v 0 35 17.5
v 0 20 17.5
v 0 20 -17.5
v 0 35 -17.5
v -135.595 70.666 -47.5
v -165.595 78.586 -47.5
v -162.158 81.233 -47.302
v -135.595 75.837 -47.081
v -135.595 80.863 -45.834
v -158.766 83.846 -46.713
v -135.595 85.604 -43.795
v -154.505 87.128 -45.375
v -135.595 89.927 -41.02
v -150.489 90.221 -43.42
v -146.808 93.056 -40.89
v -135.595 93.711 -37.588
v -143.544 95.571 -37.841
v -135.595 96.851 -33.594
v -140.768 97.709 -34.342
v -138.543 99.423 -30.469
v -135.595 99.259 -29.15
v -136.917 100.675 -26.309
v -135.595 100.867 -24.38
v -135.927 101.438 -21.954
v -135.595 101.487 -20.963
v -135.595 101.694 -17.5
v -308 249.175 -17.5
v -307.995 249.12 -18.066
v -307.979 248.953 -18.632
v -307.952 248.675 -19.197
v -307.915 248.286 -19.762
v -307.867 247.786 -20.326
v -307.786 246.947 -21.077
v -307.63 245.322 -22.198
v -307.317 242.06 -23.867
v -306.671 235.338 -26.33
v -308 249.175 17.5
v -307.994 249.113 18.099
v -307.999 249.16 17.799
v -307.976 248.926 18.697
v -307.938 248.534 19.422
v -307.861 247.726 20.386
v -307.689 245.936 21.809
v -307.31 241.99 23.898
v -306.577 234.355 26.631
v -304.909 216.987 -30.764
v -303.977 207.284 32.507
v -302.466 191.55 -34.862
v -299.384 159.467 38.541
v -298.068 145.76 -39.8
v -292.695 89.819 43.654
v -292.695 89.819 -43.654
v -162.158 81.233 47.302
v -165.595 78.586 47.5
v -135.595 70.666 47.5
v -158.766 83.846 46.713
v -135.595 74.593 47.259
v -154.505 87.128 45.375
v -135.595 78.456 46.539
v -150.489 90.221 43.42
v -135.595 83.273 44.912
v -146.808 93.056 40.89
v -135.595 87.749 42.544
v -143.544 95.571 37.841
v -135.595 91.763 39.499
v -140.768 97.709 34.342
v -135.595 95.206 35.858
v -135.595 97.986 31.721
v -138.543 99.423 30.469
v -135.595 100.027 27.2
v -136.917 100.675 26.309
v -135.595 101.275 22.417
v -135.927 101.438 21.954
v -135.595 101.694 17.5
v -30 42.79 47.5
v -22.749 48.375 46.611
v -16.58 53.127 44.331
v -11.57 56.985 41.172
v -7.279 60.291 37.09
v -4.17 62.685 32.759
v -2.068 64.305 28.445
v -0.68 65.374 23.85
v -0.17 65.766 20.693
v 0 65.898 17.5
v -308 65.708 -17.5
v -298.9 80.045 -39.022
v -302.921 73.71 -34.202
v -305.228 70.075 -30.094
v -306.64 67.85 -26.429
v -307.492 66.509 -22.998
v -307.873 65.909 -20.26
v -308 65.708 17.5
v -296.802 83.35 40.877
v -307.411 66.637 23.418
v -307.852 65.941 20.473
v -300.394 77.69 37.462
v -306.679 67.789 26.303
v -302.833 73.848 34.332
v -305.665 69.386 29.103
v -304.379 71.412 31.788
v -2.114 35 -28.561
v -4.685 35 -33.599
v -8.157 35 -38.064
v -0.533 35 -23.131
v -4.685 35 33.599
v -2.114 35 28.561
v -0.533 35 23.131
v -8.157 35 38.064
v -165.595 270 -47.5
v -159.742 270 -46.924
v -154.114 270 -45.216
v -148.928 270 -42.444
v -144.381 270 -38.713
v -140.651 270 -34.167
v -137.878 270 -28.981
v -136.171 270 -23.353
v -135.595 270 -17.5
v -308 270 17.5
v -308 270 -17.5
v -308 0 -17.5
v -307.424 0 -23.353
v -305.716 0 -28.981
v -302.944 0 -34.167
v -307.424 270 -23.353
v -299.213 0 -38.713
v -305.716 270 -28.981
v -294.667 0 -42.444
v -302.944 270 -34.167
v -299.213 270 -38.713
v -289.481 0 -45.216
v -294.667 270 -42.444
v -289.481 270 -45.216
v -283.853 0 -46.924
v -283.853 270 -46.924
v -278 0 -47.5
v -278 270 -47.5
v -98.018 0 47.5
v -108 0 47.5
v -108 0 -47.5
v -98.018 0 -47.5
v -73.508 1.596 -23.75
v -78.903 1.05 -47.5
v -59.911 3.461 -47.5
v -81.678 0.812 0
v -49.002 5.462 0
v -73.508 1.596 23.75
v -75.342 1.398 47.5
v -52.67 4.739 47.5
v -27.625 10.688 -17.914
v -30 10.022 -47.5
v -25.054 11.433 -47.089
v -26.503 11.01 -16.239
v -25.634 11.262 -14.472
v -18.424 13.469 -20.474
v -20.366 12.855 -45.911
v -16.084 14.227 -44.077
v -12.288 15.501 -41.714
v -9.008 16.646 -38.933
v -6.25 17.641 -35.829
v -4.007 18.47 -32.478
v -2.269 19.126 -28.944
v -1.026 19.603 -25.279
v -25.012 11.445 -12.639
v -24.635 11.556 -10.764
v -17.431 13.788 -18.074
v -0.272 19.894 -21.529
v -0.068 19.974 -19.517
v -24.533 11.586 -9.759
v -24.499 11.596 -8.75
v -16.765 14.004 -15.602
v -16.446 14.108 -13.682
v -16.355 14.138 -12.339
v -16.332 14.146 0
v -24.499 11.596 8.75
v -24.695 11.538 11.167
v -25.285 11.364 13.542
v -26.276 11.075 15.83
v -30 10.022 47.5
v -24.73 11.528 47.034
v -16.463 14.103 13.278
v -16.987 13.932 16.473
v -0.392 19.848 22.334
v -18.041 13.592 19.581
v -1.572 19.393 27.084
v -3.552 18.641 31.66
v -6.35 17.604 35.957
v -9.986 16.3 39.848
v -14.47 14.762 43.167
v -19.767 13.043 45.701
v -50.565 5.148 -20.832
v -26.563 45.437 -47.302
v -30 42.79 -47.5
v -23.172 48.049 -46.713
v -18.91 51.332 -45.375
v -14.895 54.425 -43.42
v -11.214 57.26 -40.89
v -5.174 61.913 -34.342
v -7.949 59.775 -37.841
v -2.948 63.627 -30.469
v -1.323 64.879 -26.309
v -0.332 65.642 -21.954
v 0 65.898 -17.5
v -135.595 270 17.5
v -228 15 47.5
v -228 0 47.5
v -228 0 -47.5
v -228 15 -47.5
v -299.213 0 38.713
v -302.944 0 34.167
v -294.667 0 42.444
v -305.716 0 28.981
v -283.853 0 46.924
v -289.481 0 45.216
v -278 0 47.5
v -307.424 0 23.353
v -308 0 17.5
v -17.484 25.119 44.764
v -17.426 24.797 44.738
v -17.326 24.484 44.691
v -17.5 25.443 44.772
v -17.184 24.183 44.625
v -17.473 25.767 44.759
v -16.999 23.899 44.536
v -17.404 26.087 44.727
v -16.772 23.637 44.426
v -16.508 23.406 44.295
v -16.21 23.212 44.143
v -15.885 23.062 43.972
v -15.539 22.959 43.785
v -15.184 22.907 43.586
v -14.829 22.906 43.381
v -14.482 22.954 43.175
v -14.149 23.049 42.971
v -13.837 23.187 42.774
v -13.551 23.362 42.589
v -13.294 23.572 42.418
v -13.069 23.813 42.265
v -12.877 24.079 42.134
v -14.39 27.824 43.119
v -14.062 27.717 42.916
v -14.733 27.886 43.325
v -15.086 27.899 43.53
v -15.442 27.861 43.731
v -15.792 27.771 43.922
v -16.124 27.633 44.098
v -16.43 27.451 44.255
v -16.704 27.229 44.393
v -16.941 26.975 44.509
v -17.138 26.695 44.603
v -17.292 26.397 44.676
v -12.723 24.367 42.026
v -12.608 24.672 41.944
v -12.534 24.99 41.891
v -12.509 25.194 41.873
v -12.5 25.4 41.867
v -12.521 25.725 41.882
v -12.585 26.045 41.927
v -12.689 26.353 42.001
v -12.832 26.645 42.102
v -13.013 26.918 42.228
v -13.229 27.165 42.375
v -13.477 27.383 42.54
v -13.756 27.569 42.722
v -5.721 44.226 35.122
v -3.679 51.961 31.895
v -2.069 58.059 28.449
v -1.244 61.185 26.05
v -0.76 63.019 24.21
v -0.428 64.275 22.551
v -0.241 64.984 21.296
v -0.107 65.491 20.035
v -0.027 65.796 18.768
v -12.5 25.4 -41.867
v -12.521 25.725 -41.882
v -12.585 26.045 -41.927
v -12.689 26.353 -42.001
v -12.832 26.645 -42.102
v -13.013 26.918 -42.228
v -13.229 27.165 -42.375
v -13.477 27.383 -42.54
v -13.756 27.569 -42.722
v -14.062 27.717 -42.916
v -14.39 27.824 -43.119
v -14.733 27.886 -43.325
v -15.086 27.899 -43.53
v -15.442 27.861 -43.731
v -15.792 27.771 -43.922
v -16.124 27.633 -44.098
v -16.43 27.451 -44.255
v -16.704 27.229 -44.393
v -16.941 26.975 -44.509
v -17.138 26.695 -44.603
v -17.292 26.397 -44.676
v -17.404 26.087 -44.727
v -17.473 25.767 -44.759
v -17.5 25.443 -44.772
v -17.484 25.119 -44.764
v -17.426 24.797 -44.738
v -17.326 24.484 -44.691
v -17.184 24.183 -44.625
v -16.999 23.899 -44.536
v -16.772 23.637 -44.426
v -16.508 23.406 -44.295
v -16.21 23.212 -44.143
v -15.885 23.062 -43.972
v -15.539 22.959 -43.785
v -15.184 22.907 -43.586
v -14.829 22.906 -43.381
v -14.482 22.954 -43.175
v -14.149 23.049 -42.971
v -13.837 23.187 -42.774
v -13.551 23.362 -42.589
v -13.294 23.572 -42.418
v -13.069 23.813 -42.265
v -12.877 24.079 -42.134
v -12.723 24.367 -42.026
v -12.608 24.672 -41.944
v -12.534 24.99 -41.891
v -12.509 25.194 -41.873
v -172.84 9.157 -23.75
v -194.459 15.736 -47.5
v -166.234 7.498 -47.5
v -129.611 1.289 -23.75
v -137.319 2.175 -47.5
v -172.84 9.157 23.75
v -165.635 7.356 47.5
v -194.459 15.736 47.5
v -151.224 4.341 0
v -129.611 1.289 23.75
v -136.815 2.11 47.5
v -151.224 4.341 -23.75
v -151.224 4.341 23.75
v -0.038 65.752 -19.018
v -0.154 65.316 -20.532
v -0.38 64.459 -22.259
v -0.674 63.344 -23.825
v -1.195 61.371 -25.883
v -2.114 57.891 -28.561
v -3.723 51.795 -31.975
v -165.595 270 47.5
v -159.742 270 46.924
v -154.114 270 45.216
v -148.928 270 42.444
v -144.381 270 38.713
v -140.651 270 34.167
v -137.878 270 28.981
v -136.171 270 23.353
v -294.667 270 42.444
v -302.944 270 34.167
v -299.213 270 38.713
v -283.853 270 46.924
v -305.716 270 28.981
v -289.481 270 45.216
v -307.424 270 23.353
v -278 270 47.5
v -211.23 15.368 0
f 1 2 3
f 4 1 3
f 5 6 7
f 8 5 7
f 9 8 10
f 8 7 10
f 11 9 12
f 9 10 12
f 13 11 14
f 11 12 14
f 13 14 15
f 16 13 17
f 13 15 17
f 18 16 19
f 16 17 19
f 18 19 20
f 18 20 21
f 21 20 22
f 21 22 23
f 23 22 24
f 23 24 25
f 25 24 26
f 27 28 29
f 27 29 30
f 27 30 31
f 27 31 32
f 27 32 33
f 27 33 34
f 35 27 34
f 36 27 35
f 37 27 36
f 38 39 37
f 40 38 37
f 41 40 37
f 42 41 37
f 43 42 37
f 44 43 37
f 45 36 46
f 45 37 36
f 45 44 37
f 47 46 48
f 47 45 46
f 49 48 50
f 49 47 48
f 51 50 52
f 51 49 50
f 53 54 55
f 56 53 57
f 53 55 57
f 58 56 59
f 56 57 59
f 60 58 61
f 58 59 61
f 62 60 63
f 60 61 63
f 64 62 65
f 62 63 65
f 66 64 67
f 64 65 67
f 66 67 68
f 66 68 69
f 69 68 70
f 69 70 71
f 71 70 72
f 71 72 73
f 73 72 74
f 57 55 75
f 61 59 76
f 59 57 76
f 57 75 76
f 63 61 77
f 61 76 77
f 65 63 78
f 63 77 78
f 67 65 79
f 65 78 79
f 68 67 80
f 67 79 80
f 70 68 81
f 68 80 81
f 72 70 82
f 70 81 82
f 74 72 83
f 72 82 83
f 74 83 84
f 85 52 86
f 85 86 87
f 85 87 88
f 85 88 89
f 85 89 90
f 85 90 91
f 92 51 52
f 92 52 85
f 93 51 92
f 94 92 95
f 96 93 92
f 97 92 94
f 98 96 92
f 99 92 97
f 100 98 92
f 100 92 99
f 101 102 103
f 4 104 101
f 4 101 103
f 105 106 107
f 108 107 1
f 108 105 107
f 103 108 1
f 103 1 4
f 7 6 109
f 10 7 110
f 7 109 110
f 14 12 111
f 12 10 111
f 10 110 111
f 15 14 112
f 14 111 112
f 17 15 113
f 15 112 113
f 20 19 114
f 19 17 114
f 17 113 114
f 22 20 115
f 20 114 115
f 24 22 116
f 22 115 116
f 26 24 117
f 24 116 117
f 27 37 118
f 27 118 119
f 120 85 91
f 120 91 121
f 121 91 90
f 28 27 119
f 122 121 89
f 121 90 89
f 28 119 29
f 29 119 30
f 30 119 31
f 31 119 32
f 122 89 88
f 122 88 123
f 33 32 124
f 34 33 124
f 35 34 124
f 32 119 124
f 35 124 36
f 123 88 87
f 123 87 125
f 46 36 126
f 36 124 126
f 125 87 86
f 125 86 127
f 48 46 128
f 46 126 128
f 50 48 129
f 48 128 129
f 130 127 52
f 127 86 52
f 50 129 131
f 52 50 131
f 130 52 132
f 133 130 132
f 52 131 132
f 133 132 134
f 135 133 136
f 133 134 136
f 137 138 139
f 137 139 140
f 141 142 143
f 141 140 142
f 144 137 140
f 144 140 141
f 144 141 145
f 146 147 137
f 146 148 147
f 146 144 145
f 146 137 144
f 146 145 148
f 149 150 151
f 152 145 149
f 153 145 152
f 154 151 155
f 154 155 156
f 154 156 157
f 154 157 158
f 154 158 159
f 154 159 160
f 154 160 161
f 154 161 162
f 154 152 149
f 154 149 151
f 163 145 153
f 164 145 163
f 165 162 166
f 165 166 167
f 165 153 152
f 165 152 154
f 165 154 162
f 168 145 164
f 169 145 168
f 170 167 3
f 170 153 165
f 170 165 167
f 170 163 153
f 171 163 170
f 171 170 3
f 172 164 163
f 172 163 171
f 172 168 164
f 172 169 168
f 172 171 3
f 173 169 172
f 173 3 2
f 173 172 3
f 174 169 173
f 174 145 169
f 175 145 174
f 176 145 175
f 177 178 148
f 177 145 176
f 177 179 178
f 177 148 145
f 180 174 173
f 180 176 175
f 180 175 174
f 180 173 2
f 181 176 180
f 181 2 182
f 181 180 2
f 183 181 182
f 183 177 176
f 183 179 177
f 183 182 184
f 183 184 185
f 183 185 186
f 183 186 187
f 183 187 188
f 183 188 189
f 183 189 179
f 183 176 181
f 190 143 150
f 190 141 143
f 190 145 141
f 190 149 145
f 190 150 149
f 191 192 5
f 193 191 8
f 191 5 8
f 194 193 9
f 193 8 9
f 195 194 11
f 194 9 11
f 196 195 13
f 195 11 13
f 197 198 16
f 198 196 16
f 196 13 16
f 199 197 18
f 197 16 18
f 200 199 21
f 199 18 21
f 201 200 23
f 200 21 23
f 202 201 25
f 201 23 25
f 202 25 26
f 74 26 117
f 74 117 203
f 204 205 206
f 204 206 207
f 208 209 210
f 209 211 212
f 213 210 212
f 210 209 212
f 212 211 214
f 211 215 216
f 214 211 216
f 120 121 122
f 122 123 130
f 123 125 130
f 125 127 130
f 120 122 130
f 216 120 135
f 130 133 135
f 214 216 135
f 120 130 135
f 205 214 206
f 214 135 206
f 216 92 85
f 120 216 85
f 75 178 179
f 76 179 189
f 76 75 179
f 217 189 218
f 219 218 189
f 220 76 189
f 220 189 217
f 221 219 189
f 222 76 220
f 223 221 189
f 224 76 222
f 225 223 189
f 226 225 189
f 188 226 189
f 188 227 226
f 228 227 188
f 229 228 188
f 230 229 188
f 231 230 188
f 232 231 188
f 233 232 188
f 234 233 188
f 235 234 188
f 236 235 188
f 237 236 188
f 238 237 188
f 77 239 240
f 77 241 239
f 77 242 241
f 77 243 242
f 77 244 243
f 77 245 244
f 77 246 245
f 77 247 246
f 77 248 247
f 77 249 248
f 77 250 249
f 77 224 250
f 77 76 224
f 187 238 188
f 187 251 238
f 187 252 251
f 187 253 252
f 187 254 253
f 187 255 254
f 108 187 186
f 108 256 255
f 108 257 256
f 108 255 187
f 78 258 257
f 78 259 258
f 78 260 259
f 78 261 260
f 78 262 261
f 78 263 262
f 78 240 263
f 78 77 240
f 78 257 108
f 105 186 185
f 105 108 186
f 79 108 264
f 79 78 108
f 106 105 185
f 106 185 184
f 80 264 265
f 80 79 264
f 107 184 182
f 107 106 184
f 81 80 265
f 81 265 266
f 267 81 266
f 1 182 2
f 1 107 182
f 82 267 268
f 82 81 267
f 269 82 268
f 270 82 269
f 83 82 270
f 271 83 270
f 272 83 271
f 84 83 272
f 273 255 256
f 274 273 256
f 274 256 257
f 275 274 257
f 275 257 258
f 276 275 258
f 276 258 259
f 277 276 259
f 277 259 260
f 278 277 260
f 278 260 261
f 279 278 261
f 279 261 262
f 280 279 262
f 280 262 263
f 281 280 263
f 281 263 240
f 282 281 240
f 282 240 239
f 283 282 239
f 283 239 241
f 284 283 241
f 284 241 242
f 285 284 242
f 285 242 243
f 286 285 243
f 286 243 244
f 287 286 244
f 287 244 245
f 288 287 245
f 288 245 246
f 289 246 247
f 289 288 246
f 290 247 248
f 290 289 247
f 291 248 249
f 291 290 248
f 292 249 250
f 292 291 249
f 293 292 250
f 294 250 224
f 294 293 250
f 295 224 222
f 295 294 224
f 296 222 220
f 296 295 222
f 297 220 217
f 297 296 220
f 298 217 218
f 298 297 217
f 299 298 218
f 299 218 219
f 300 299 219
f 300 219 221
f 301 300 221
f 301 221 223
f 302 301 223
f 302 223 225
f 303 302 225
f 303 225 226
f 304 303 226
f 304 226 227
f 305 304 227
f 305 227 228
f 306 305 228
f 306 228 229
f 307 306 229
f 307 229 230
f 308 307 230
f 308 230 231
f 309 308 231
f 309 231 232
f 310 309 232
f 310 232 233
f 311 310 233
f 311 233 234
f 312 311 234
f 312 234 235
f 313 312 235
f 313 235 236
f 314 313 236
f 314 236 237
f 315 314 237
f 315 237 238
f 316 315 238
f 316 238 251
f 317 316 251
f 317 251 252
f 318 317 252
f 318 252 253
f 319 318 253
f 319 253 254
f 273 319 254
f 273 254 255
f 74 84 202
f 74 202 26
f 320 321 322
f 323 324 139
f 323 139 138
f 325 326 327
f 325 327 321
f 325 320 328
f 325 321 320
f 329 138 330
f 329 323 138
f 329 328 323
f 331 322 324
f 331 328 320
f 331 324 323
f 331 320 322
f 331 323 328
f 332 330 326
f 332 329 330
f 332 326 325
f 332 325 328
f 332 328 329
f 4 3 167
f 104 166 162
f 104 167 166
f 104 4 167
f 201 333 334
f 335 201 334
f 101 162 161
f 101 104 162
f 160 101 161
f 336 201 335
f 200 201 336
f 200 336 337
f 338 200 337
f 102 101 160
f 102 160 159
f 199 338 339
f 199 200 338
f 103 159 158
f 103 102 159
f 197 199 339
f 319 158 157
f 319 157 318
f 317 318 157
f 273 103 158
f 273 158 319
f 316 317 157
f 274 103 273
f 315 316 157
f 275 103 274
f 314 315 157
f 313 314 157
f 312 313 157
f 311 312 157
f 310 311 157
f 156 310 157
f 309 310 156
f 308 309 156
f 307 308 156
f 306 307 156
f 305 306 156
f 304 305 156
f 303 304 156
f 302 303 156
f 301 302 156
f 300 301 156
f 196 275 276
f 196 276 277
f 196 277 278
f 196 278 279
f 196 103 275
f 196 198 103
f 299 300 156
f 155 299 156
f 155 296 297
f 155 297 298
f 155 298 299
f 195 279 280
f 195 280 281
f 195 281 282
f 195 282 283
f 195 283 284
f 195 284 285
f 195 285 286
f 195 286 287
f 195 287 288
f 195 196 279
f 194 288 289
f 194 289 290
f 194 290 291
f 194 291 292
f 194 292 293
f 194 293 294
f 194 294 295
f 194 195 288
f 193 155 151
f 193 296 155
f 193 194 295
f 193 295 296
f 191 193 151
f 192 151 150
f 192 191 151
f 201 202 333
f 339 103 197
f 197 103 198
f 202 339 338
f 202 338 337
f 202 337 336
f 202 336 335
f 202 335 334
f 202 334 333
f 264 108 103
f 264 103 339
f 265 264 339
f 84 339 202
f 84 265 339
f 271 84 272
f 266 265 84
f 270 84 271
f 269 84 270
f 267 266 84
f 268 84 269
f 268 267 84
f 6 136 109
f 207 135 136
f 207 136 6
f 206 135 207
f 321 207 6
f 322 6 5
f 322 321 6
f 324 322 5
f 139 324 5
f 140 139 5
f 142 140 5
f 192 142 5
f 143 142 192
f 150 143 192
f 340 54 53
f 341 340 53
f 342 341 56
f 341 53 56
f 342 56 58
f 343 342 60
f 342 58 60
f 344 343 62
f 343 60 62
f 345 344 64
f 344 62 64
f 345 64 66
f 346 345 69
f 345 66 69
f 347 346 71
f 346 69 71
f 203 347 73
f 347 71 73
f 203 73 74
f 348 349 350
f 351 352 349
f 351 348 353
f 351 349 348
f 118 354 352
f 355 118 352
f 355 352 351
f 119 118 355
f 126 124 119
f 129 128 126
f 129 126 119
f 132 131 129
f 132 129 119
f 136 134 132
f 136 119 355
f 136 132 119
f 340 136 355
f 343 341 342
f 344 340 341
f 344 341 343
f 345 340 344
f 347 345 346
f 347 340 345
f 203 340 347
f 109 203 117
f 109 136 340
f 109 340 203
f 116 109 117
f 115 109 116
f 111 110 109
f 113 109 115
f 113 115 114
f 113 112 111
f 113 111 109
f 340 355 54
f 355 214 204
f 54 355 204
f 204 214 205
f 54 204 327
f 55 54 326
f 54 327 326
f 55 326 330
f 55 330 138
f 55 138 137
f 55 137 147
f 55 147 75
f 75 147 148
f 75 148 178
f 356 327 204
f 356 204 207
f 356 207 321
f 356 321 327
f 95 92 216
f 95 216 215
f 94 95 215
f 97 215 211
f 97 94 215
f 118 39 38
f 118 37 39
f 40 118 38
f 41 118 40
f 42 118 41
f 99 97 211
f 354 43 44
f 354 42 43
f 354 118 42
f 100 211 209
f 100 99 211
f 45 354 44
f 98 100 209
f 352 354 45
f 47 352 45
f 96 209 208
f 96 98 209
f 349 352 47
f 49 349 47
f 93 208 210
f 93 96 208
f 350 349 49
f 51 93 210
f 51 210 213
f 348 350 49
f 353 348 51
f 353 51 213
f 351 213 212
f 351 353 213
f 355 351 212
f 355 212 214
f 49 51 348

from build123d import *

# Parameters (mm, degrees)
SKETCH1_W               = 308
SKETCH1_H               = 95
BOSS_EXTRUDE1_DEPTH     = 270
FILLET1_R               = 30
SKETCH2_OUTSIDE_W       = 394.092
SKETCH2_OUTSIDE_H       = 356.092
CUT_EXTRUDE1_DEPTH      = 421.462840213
FILLET2_R               = 30
CUT_EXTRUDE2_DEPTH      = 413.33511864
CUT_EXTRUDE2_DEPTH_BACK = 413.33511864
SKETCH3_R               = 2.5


with BuildPart() as part:
    # Sketch1 → Boss-Extrude1 (new body)
    with BuildSketch(Plane(origin=(0, 0, 0), x_dir=(1, 0, 0), z_dir=(0, 1, 0))):
        with Locations((-154, 0)):
            Rectangle(SKETCH1_W, SKETCH1_H)
    extrude(amount=BOSS_EXTRUDE1_DEPTH)

    # Fillet1
    fillet1_edges = [part.edges().sort_by_distance(p)[0] for p in [
        (-308, 135, -47.5),
        (0, 135, -47.5),
        (0, 135, 47.5),
        (-308, 135, 47.5),
    ]]
    fillet(fillet1_edges, radius=FILLET1_R)

    # Sketch2 outside → Cut-Extrude1 (cut, through all)
    with BuildSketch(Plane.XY.offset(47.5)):
        with Locations((-154, 135)):
            Rectangle(SKETCH2_OUTSIDE_W, SKETCH2_OUTSIDE_H)
        with BuildLine():
            Line((-228, 0), (-228, 15))
            add(Edge.make_bspline(
                [(-228, 15), (-211.229646979, 15.3677709), (-194.459293959, 15.735541799)],
                knots=[0, 0, 0, 0.14710836, 0.14710836, 0.14710836], degree=2))
            add(Edge.make_bspline(
                [(-194.459293959, 15.735541799), (-97.174631898, -17.834493168), (0, 20)],
                knots=[0, 0, 0, 1, 1, 1], degree=2))
            Line((0, 20), (0, 35))
            Line((0, 35), (-8.156845185, 35))
            Line((-8.156845185, 35), (0, 65.897747125))
            Line((0, 65.897747125), (-135.594672757, 101.694038328))
            Line((-135.594672757, 101.694038328), (-135.594672757, 270))
            Line((-135.594672757, 270), (-310, 270))
            Line((-310, 270), (-292.695445045, 89.818838494))
            Line((-292.695445045, 89.818838494), (-308, 65.708414359))
            Line((-308, 65.708414359), (-308, 0))
            Line((-308, 0), (-228, 0))
        make_face(mode=Mode.SUBTRACT)
    extrude(amount=-CUT_EXTRUDE1_DEPTH, mode=Mode.SUBTRACT)

    # Fillet2
    # the kernel refuses this fillet: 30 mm, written as the material it takes off along each edge
    with BuildSketch(Plane(origin=(-208.110304148, 120.83778937, -47.5), x_dir=(-0.2552500139062178, -0.9668750852105331, 0), z_dir=(0.9668750852105331, -0.2552500139062178, 0))) as fillet2_piece_1_section:
        with BuildLine():
            CenterArc((FILLET2_R, -FILLET2_R), FILLET2_R, 90, 90)
            Line((0, -FILLET2_R), (0, 0))
            Line((0, 0), (FILLET2_R, 0))
        make_face()
    fillet2_piece_1 = extrude(amount=259.212321604, mode=Mode.PRIVATE)
    fillet2_piece_1 = split(fillet2_piece_1, bisect_by=Plane(origin=(-135.594672757, 71.448800887, -40.672385081), z_dir=(1, 0, 0)), keep=Keep.TOP, mode=Mode.PRIVATE)
    add(fillet2_piece_1, mode=Mode.SUBTRACT)
    with BuildSketch(Plane(origin=(42.515631391, 54.673840676, 47.5), x_dir=(0, 0, -1), z_dir=(-0.9668750852105331, 0.2552500139062178, 0))) as fillet2_piece_2_section:
        with BuildLine():
            CenterArc((FILLET2_R, FILLET2_R), FILLET2_R, 180, 90)
            Line((0, FILLET2_R), (0, 0))
            Line((0, 0), (FILLET2_R, 0))
        make_face()
    fillet2_piece_2 = extrude(amount=259.212321604, mode=Mode.PRIVATE)
    fillet2_piece_2 = split(fillet2_piece_2, bisect_by=Plane(origin=(-135.594672757, 71.448800887, 40.672385081), z_dir=(1, 0, 0)), keep=Keep.TOP, mode=Mode.PRIVATE)
    add(fillet2_piece_2, mode=Mode.SUBTRACT)
    with BuildSketch(Plane(origin=(-135.594672757, 345, -47.5), x_dir=(-1, 0, 0), z_dir=(0, -1, 0))) as fillet2_piece_3_section:
        with BuildLine():
            CenterArc((FILLET2_R, -FILLET2_R), FILLET2_R, 90, 90)
            Line((0, -FILLET2_R), (0, 0))
            Line((0, 0), (FILLET2_R, 0))
        make_face()
    fillet2_piece_3 = extrude(amount=318.305961672, mode=Mode.PRIVATE)
    fillet2_piece_3 = split(fillet2_piece_3, bisect_by=Plane(origin=(-172.144372256, 111.342969661, -40.68113524), z_dir=(0.2552500139062178, 0.9668750852105331, 0)), keep=Keep.TOP, mode=Mode.PRIVATE)
    add(fillet2_piece_3, mode=Mode.SUBTRACT)
    with BuildSketch(Plane(origin=(-135.594672757, 26.694038328, 47.5), x_dir=(0, 0, -1), z_dir=(0, 1, 0))) as fillet2_piece_4_section:
        with BuildLine():
            CenterArc((FILLET2_R, FILLET2_R), FILLET2_R, 180, 90)
            Line((0, FILLET2_R), (0, 0))
            Line((0, 0), (FILLET2_R, 0))
        make_face()
    fillet2_piece_4 = extrude(amount=318.305961672, mode=Mode.PRIVATE)
    fillet2_piece_4 = split(fillet2_piece_4, bisect_by=Plane(origin=(-172.144372256, 111.342969661, 40.68113524), z_dir=(0.2552500139062178, 0.9668750852105331, 0)), keep=Keep.TOP, mode=Mode.PRIVATE)
    add(fillet2_piece_4, mode=Mode.SUBTRACT)
    with BuildSketch(Plane(origin=(-208.110304148, 120.83778937, -47.5), x_dir=(-0.2552500139062178, -0.9668750852105331, 0), z_dir=(0.9668750852105331, -0.2552500139062178, 0))) as fillet2_piece_5a_section:
        with BuildLine():
            CenterArc((FILLET2_R, -FILLET2_R), FILLET2_R, 90, 90)
            Line((0, -FILLET2_R), (0, 0))
            Line((0, 0), (FILLET2_R, 0))
        make_face()
    fillet2_piece_5a = extrude(amount=259.212321604, mode=Mode.PRIVATE)
    fillet2_piece_5a = split(fillet2_piece_5a, bisect_by=Plane(origin=(-135.594672757, 104.326327601, -40.79309683), z_dir=(-1, 0, 0)), keep=Keep.TOP, mode=Mode.PRIVATE)
    with BuildSketch(Plane(origin=(-135.594672757, 345, -47.5), x_dir=(-1, 0, 0), z_dir=(0, -1, 0))) as fillet2_piece_5b_section:
        with BuildLine():
            CenterArc((FILLET2_R, -FILLET2_R), FILLET2_R, 90, 90)
            Line((0, -FILLET2_R), (0, 0))
            Line((0, 0), (FILLET2_R, 0))
        make_face()
    fillet2_piece_5b = extrude(amount=318.305961672, mode=Mode.PRIVATE)
    fillet2_piece_5b = split(fillet2_piece_5b, bisect_by=Plane(origin=(-133.049577842, 101.022146454, -40.79309683), z_dir=(-0.2552500139062178, -0.9668750852105331, 0)), keep=Keep.TOP, mode=Mode.PRIVATE)
    fillet2_piece_5 = fillet2_piece_5a & fillet2_piece_5b
    add(fillet2_piece_5, mode=Mode.SUBTRACT)
    with BuildSketch(Plane(origin=(42.515631391, 54.673840676, 47.5), x_dir=(0, 0, -1), z_dir=(-0.9668750852105331, 0.2552500139062178, 0))) as fillet2_piece_6a_section:
        with BuildLine():
            CenterArc((FILLET2_R, FILLET2_R), FILLET2_R, 180, 90)
            Line((0, FILLET2_R), (0, 0))
            Line((0, 0), (FILLET2_R, 0))
        make_face()
    fillet2_piece_6a = extrude(amount=259.212321604, mode=Mode.PRIVATE)
    fillet2_piece_6a = split(fillet2_piece_6a, bisect_by=Plane(origin=(-135.594672757, 104.326327601, 40.79309683), z_dir=(-1, 0, 0)), keep=Keep.TOP, mode=Mode.PRIVATE)
    with BuildSketch(Plane(origin=(-135.594672757, 26.694038328, 47.5), x_dir=(0, 0, -1), z_dir=(0, 1, 0))) as fillet2_piece_6b_section:
        with BuildLine():
            CenterArc((FILLET2_R, FILLET2_R), FILLET2_R, 180, 90)
            Line((0, FILLET2_R), (0, 0))
            Line((0, 0), (FILLET2_R, 0))
        make_face()
    fillet2_piece_6b = extrude(amount=318.305961672, mode=Mode.PRIVATE)
    fillet2_piece_6b = split(fillet2_piece_6b, bisect_by=Plane(origin=(-133.049577842, 101.022146454, 40.79309683), z_dir=(-0.2552500139062178, -0.9668750852105331, 0)), keep=Keep.TOP, mode=Mode.PRIVATE)
    fillet2_piece_6 = fillet2_piece_6a & fillet2_piece_6b
    add(fillet2_piece_6, mode=Mode.SUBTRACT)

    # Sketch3 → Cut-Extrude2 (cut, two sides: drawn at the far end of the back side and taken through both)
    with BuildSketch(Plane.XY.offset(-CUT_EXTRUDE2_DEPTH_BACK)):
        with Locations((-15, 25.4)):
            Circle(SKETCH3_R)
    extrude(amount=CUT_EXTRUDE2_DEPTH + CUT_EXTRUDE2_DEPTH_BACK, mode=Mode.SUBTRACT)


solid = part.part
